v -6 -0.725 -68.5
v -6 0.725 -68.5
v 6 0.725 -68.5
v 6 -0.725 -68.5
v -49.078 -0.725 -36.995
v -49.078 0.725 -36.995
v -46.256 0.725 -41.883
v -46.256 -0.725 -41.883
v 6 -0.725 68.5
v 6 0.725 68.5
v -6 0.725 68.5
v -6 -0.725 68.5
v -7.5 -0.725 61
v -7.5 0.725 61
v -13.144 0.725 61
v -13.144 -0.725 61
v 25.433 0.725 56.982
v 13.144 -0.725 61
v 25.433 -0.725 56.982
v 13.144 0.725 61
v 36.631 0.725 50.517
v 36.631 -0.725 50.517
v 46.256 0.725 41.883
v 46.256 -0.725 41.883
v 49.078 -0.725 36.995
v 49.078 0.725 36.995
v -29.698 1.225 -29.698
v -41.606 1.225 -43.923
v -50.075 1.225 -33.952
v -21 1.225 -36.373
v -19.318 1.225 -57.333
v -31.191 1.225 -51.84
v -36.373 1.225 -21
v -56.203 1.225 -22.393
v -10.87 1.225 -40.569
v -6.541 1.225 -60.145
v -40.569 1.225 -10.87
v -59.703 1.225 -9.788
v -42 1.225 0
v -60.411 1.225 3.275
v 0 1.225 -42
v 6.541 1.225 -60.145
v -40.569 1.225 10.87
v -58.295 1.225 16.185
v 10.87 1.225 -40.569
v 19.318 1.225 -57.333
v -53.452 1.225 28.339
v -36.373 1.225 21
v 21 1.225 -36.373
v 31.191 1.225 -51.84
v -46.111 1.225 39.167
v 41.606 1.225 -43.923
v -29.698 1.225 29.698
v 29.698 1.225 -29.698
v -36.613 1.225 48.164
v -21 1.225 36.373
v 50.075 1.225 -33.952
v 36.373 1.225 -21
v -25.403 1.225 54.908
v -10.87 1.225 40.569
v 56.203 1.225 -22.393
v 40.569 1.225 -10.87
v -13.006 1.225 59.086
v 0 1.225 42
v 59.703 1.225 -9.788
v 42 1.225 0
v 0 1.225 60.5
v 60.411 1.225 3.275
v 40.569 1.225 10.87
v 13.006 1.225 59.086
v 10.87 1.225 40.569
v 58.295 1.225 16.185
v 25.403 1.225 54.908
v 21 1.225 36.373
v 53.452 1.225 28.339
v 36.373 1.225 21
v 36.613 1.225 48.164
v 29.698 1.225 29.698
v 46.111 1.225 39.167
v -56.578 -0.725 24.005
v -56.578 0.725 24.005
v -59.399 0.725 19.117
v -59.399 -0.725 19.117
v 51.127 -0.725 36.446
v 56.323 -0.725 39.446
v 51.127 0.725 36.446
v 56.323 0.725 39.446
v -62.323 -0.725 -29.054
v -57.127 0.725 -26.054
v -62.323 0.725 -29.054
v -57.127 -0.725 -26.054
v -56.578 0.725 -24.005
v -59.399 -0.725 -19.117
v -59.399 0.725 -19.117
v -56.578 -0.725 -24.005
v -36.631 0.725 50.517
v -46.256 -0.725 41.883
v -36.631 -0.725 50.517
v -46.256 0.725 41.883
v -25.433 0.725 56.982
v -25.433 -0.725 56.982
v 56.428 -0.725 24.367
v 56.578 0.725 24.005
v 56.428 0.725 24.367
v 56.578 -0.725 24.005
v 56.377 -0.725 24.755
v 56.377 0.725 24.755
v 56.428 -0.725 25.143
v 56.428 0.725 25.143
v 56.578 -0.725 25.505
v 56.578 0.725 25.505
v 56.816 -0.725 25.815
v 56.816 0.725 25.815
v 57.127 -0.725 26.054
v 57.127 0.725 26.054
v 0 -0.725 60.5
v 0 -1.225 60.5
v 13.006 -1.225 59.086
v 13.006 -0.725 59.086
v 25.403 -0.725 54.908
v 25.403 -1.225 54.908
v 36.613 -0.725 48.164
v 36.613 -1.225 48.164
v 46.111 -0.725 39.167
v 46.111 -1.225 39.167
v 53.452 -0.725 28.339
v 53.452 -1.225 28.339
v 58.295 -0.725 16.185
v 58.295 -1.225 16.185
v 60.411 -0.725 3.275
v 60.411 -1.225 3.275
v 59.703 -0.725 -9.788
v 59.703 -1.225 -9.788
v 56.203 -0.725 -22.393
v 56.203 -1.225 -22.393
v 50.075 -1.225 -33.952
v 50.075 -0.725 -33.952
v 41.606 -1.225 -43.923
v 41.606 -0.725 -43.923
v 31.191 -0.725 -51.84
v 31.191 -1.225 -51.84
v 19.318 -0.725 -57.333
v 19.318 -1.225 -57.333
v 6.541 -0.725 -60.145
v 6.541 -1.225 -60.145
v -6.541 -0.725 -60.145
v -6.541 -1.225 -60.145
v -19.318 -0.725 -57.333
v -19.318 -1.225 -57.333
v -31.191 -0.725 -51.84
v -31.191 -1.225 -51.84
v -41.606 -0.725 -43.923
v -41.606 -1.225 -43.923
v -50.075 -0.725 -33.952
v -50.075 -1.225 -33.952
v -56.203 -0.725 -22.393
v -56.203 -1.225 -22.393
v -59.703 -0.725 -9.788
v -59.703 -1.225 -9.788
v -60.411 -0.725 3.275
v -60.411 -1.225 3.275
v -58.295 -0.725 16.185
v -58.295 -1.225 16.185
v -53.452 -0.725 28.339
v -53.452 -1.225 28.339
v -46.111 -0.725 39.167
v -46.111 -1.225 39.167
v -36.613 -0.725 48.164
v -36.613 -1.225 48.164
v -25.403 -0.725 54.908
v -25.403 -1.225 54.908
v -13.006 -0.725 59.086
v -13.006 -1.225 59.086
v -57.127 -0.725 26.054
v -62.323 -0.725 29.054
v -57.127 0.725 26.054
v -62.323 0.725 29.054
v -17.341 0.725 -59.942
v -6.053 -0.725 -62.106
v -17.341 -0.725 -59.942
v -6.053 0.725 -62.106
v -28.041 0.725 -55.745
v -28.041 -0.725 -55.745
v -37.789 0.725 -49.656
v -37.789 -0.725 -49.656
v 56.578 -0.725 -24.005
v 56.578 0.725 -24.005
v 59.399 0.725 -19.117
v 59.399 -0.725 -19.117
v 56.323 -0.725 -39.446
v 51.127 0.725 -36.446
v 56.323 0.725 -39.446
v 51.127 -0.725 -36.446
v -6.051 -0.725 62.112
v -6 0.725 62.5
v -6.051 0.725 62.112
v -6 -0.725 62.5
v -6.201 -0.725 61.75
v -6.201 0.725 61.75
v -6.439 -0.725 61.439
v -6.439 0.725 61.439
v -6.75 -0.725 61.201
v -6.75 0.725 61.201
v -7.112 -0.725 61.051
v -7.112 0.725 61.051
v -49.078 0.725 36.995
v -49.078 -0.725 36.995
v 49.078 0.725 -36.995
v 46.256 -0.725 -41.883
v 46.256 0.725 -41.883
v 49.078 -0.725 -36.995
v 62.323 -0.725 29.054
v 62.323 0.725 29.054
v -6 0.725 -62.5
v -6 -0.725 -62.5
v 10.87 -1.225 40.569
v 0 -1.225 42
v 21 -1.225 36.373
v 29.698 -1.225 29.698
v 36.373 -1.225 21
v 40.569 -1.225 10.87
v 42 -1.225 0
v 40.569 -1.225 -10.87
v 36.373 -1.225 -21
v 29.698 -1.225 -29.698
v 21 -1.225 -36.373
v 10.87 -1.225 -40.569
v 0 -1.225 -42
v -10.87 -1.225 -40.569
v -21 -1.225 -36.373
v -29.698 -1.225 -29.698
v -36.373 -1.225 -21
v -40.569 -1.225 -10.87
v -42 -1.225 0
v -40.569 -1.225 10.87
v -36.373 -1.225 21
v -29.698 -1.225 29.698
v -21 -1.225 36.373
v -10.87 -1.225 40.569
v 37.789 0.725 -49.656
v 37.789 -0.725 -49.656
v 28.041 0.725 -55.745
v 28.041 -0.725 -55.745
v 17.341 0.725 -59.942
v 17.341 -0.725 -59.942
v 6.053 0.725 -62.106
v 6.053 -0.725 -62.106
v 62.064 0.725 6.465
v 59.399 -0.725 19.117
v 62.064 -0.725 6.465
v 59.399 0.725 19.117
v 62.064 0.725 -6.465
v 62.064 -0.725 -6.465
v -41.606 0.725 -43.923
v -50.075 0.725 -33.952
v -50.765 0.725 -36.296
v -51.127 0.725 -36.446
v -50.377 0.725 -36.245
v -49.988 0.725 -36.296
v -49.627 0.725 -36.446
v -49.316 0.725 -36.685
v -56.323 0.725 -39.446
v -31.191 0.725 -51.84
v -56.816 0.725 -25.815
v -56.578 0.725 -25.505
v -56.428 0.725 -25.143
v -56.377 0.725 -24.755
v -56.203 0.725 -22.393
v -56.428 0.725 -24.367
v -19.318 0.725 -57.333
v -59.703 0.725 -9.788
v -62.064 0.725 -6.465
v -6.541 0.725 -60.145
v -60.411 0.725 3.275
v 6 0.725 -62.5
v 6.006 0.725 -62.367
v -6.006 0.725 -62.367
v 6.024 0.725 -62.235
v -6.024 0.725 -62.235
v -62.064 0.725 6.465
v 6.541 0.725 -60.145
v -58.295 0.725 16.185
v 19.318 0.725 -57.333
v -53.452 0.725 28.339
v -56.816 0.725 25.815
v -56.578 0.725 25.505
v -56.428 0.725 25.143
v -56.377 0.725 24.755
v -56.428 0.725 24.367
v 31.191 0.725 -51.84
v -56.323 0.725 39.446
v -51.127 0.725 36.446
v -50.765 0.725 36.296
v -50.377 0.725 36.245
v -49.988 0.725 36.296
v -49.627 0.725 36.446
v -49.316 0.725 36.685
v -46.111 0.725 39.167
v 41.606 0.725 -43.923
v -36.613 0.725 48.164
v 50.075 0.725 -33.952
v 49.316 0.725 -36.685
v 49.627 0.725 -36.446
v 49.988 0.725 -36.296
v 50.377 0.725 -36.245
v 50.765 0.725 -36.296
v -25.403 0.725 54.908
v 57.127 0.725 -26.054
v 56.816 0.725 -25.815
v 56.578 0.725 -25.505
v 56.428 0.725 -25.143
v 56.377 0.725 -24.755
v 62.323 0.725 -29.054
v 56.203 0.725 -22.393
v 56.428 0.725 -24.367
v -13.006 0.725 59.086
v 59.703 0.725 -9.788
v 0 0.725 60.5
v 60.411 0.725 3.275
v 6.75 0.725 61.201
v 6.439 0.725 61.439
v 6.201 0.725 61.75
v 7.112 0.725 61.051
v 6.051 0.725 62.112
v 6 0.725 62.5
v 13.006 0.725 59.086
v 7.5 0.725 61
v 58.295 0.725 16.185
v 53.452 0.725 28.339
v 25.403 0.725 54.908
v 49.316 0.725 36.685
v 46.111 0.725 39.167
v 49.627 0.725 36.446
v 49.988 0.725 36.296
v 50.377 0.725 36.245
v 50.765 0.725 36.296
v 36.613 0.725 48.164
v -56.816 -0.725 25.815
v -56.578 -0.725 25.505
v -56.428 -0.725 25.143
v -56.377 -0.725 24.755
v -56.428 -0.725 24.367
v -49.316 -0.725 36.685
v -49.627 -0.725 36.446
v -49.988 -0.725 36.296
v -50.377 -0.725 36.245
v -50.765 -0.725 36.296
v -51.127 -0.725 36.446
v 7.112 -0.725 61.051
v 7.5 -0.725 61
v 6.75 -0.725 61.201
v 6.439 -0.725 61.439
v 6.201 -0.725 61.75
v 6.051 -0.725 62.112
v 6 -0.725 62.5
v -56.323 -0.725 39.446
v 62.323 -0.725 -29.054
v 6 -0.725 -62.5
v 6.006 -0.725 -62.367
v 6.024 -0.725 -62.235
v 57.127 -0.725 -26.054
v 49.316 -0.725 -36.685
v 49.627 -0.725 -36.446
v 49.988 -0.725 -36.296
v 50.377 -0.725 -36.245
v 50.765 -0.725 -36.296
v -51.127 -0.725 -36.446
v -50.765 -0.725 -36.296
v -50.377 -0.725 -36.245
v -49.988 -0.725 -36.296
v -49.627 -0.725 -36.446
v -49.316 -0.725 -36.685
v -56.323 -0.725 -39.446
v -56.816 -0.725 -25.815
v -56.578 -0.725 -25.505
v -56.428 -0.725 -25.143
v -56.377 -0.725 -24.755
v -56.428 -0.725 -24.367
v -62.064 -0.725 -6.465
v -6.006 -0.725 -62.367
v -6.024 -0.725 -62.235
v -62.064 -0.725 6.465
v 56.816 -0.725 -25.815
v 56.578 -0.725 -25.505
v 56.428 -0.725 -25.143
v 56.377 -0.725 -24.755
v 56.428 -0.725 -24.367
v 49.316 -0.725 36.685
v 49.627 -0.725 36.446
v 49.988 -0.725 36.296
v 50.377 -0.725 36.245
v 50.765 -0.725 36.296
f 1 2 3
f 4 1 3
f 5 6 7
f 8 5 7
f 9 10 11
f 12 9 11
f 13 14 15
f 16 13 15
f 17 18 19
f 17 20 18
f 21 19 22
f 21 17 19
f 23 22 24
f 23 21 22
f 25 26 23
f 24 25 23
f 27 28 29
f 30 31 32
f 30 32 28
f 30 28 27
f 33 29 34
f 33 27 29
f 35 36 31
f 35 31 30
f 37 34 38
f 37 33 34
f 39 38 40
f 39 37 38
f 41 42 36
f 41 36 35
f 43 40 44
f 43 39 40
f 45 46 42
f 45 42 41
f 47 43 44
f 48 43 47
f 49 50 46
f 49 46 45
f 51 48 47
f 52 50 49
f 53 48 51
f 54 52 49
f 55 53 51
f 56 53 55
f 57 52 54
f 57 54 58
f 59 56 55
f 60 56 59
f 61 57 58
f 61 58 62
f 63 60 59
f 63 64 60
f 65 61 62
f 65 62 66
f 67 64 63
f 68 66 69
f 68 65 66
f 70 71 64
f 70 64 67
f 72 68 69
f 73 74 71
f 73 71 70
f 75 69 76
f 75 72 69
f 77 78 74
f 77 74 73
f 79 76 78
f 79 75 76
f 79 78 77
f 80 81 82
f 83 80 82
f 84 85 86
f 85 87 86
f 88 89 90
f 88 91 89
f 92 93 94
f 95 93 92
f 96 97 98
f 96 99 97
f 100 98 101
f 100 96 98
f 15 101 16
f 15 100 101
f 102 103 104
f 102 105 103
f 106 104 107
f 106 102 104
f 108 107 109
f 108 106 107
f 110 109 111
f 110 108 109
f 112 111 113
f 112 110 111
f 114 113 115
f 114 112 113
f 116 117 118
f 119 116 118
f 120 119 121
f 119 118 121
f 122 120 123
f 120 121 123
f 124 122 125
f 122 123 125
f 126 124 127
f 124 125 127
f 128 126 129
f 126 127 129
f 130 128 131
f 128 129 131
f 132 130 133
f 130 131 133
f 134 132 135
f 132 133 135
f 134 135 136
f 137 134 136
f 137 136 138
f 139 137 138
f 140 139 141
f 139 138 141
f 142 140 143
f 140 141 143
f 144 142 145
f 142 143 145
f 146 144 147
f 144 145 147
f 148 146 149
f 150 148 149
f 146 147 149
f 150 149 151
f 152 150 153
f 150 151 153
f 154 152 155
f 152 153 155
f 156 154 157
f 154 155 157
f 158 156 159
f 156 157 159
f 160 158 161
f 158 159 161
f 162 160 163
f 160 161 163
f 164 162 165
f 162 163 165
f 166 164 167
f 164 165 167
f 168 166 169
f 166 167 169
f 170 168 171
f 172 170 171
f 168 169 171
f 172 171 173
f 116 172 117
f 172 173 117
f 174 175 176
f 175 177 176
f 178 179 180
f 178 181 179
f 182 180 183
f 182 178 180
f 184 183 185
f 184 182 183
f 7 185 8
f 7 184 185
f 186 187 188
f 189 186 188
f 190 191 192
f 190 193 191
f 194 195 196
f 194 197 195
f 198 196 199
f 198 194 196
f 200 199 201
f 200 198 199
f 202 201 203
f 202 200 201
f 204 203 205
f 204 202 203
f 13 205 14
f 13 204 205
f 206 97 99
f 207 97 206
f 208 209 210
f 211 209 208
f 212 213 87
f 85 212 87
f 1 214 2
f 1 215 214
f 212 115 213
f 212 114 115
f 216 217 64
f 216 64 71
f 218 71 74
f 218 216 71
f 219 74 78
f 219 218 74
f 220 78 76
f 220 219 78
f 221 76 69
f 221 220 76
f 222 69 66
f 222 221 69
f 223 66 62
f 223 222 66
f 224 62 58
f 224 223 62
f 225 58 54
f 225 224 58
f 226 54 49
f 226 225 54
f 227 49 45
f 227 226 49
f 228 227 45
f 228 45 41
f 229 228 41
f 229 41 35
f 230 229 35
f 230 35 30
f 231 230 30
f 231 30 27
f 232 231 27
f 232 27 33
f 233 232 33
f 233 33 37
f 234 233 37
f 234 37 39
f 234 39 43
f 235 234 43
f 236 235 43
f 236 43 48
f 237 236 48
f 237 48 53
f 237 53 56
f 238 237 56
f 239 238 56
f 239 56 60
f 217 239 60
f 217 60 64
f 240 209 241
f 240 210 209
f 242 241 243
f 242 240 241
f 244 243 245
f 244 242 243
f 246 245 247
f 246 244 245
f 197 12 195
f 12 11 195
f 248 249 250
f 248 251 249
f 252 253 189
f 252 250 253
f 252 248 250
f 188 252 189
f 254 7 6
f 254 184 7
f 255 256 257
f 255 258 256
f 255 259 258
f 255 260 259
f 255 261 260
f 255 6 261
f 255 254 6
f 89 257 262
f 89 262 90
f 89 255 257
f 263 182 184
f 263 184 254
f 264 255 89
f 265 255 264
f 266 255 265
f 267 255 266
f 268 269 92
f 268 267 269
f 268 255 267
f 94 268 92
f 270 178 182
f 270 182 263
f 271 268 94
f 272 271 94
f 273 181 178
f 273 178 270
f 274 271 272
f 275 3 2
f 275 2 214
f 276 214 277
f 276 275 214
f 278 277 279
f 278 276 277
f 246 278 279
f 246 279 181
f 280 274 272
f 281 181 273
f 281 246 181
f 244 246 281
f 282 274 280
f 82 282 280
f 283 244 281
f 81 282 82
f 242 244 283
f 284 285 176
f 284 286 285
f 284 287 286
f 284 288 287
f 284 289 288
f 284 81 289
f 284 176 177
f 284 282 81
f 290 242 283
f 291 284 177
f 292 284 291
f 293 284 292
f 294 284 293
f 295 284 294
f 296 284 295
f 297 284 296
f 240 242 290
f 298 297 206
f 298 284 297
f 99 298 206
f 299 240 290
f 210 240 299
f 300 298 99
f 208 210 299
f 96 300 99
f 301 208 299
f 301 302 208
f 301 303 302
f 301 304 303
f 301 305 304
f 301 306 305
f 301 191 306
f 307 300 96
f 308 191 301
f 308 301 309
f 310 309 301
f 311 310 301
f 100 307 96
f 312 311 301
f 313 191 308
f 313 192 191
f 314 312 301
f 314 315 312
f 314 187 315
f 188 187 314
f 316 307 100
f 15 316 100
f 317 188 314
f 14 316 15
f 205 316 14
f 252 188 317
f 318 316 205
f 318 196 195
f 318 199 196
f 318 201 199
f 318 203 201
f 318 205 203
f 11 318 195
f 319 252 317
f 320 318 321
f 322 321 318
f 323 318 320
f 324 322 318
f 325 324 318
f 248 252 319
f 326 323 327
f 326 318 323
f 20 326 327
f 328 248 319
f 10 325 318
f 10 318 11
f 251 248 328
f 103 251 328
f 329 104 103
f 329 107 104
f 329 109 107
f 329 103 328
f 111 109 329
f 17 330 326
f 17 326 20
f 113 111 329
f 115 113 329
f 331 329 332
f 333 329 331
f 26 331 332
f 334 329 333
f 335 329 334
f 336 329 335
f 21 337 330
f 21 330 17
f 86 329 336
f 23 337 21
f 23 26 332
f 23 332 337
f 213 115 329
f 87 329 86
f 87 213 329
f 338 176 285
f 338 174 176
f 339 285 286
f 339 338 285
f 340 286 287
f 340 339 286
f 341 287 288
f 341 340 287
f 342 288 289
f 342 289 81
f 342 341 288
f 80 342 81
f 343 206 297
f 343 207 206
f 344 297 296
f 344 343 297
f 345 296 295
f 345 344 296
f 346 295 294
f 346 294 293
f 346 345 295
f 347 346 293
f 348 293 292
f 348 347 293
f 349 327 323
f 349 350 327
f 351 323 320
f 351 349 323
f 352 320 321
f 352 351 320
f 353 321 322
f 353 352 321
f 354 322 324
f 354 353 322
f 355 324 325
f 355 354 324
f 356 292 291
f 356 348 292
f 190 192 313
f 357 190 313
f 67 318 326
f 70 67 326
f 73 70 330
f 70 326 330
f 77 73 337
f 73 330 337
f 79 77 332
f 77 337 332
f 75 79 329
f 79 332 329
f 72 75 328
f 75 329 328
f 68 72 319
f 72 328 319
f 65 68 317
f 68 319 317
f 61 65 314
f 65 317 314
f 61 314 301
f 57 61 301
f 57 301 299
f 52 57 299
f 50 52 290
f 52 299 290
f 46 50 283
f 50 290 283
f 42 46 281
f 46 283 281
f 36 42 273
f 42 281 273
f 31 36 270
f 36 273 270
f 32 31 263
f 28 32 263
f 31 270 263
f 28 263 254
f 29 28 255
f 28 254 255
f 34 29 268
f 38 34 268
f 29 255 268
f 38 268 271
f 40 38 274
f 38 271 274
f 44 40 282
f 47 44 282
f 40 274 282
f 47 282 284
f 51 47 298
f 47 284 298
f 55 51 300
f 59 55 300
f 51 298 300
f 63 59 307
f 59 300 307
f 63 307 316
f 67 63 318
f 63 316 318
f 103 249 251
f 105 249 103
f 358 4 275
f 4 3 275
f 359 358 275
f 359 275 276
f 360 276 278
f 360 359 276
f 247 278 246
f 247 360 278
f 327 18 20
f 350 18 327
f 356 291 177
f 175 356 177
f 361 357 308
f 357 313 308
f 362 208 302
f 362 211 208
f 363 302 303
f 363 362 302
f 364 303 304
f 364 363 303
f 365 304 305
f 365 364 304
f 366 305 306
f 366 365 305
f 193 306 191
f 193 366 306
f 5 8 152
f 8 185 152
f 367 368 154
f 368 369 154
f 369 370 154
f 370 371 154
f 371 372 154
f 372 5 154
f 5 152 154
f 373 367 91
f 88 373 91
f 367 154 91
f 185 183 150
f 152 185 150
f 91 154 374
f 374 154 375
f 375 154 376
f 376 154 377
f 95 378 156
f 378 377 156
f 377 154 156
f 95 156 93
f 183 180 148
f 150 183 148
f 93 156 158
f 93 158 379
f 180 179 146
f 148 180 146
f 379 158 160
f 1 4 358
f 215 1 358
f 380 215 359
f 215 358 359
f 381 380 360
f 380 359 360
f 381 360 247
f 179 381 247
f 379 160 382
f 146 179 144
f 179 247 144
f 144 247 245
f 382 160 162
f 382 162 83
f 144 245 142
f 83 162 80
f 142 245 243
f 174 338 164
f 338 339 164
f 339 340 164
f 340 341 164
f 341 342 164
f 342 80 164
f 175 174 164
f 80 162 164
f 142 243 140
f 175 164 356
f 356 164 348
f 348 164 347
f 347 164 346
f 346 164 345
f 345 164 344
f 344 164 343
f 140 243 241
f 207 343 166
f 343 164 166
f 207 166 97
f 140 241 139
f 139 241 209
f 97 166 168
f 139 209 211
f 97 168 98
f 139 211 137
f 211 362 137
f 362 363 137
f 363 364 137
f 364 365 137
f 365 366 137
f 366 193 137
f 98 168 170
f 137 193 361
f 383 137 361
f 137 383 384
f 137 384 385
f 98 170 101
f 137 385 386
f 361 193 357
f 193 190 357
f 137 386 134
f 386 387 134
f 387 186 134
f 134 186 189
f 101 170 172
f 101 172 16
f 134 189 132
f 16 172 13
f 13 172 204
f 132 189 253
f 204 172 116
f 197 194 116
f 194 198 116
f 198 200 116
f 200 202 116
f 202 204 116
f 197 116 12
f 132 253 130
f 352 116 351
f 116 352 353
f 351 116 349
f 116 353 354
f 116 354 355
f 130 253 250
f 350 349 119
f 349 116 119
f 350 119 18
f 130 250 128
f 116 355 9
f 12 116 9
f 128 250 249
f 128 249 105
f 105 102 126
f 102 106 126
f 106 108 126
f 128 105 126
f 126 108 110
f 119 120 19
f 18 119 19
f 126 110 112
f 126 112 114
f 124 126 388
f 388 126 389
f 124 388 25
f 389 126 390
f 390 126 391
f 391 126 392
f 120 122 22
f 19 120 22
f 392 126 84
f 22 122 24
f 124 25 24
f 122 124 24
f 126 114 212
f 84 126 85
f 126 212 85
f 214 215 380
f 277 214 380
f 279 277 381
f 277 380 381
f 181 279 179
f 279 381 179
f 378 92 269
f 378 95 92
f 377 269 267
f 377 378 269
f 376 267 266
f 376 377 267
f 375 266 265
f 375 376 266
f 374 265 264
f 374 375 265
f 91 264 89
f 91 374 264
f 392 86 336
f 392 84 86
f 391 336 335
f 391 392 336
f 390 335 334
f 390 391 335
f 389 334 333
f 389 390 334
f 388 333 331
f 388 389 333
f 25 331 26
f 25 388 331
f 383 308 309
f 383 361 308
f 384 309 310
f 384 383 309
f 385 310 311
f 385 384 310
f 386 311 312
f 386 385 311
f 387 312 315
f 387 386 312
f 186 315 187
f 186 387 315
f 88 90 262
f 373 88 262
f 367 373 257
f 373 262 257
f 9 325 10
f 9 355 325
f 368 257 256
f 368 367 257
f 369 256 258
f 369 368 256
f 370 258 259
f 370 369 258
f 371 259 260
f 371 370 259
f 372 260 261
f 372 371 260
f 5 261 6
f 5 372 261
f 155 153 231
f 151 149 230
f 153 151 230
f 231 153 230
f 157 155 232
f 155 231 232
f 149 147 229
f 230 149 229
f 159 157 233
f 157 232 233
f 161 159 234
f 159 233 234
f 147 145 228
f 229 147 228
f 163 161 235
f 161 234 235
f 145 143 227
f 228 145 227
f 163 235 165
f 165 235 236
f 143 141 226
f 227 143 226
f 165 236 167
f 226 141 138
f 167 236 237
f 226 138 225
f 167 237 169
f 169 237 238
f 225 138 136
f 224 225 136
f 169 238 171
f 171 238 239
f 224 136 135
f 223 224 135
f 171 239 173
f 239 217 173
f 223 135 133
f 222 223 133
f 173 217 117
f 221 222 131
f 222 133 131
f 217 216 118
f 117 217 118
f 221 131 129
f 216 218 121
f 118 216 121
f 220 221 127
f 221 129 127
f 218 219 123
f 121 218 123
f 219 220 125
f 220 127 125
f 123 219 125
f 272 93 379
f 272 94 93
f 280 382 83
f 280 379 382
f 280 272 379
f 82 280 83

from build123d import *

# Parameters (mm, degrees)
SKETCH1_R                = 62.4
SKETCH1_R_2              = 42
BOSS_EXTRUDE1_DEPTH      = 0.725
BOSS_EXTRUDE2_DEPTH      = 0.725
CUT_EXTRUDE2_DEPTH       = 93.663561474
FILLET1_R                = 1.5
CIRPATTERN1_COUNT        = 6
FILLET1_OF_CIRPATTERN1_R = 1.5
BOSS_EXTRUDE3_START      = 0.725
SKETCH5_R                = 60.5
SKETCH5_R_2              = 42
BOSS_EXTRUDE3_DEPTH      = 0.5
BOSS_EXTRUDE5_START      = -1.225
SKETCH5_4_R              = 60.5
SKETCH5_4_R_2            = 42
BOSS_EXTRUDE5_DEPTH      = 0.5


with BuildPart() as part:
    # Sketch1 → Boss-Extrude1 (new, symmetric)
    with BuildSketch(Plane(origin=(0, 0, 0), x_dir=(1, 0, 0), z_dir=(0, 1, 0))):
        with Locations(Location((0, 0, 0), (0, 0, 270))):
            Circle(SKETCH1_R)
        with Locations(Location((0, 0, 0), (0, 0, 270))):
            Circle(SKETCH1_R_2, mode=Mode.SUBTRACT)
    boss_extrude1 = extrude(amount=BOSS_EXTRUDE1_DEPTH, both=True)

    # Sketch2 → Boss-Extrude2 (add, symmetric)
    with BuildSketch(Plane(origin=(0, 0, 0), x_dir=(1, 0, 0), z_dir=(0, 1, 0))):
        with BuildLine():
            Line((-6, 68.5), (6, 68.5))
            Line((6, 68.5), (6, 62.110868614))
            ThreePointArc((6, 62.110868614), (0, 62.4), (-6, 62.110868614))
            Line((-6, 62.110868614), (-6, 68.5))
        make_face()
    boss_extrude2 = extrude(amount=BOSS_EXTRUDE2_DEPTH, both=True)

    # Sketch4 → Cut-Extrude2 (cut, symmetric)
    with BuildSketch(Plane(origin=(0, 0, 0), x_dir=(1, 0, 0), z_dir=(0, 1, 0))):
        with BuildLine():
            ThreePointArc((-6, 62.110868614), (-9.588011618, 61.658981772), (-13.143819841, 61))
            Line((-13.143819841, 61), (-6, 61))
            Line((-6, 61), (-6, 62.110868614))
        make_face()
        with BuildLine():
            Line((6, 61), (13.143819841, 61))
            ThreePointArc((13.143819841, 61), (9.588011618, 61.658981772), (6, 62.110868614))
            Line((6, 62.110868614), (6, 61))
        make_face()
    cut_extrude2 = extrude(amount=CUT_EXTRUDE2_DEPTH, both=True, mode=Mode.SUBTRACT)

    # Fillet1
    fillet1_edges = [part.edges().sort_by_distance(p)[0] for p in [
        (-6, 0, -61),
        (6, 0, -61),
    ]]
    fillet(fillet1_edges, radius=FILLET1_R)

    # CirPattern1: Boss-Extrude1, Boss-Extrude2, Cut-Extrude2 ×6 about axis
    cirpattern1_axis = Axis((0, 0, 0), (0, 1, 0))
    add([boss_extrude1.rotate(cirpattern1_axis, i * 360 / CIRPATTERN1_COUNT) for i in range(1, CIRPATTERN1_COUNT)])
    add([boss_extrude2.rotate(cirpattern1_axis, i * 360 / CIRPATTERN1_COUNT) for i in range(1, CIRPATTERN1_COUNT)])
    add([cut_extrude2.rotate(cirpattern1_axis, i * 360 / CIRPATTERN1_COUNT) for i in range(1, CIRPATTERN1_COUNT)], mode=Mode.SUBTRACT)

    # Fillet1 of CirPattern1
    fillet1_of_cirpattern1_edges = [part.edges().sort_by_distance(p)[0] for p in [
        (-55.827549631, 0, -25.303847577),
        (-49.827549631, 0, -35.696152423),
        (-49.827549631, 0, 35.696152423),
        (-55.827549631, 0, 25.303847577),
        (6, 0, 61),
        (-6, 0, 61),
        (55.827549631, 0, 25.303847577),
        (49.827549631, 0, 35.696152423),
        (49.827549631, 0, -35.696152423),
        (55.827549631, 0, -25.303847577),
    ]]
    fillet(fillet1_of_cirpattern1_edges, radius=FILLET1_OF_CIRPATTERN1_R)

    # Sketch5 → Boss-Extrude3 (add)
    with BuildSketch(Plane(origin=(0, 0, 0), x_dir=(1, 0, 0), z_dir=(0, 1, 0)).offset(BOSS_EXTRUDE3_START)):
        with Locations(Location((0, 0, 0), (0, 0, 270))):
            Circle(SKETCH5_R)
        with Locations(Location((0, 0, 0), (0, 0, 270))):
            Circle(SKETCH5_R_2, mode=Mode.SUBTRACT)
    extrude(amount=BOSS_EXTRUDE3_DEPTH)

    # Sketch5<4> → Boss-Extrude5 (add)
    with BuildSketch(Plane(origin=(0, 0, 0), x_dir=(1, 0, 0), z_dir=(0, 1, 0)).offset(BOSS_EXTRUDE5_START)):
        with Locations(Location((0, 0, 0), (0, 0, 270))):
            Circle(SKETCH5_4_R)
        with Locations(Location((0, 0, 0), (0, 0, 270))):
            Circle(SKETCH5_4_R_2, mode=Mode.SUBTRACT)
    extrude(amount=BOSS_EXTRUDE5_DEPTH)


solid = part.part
